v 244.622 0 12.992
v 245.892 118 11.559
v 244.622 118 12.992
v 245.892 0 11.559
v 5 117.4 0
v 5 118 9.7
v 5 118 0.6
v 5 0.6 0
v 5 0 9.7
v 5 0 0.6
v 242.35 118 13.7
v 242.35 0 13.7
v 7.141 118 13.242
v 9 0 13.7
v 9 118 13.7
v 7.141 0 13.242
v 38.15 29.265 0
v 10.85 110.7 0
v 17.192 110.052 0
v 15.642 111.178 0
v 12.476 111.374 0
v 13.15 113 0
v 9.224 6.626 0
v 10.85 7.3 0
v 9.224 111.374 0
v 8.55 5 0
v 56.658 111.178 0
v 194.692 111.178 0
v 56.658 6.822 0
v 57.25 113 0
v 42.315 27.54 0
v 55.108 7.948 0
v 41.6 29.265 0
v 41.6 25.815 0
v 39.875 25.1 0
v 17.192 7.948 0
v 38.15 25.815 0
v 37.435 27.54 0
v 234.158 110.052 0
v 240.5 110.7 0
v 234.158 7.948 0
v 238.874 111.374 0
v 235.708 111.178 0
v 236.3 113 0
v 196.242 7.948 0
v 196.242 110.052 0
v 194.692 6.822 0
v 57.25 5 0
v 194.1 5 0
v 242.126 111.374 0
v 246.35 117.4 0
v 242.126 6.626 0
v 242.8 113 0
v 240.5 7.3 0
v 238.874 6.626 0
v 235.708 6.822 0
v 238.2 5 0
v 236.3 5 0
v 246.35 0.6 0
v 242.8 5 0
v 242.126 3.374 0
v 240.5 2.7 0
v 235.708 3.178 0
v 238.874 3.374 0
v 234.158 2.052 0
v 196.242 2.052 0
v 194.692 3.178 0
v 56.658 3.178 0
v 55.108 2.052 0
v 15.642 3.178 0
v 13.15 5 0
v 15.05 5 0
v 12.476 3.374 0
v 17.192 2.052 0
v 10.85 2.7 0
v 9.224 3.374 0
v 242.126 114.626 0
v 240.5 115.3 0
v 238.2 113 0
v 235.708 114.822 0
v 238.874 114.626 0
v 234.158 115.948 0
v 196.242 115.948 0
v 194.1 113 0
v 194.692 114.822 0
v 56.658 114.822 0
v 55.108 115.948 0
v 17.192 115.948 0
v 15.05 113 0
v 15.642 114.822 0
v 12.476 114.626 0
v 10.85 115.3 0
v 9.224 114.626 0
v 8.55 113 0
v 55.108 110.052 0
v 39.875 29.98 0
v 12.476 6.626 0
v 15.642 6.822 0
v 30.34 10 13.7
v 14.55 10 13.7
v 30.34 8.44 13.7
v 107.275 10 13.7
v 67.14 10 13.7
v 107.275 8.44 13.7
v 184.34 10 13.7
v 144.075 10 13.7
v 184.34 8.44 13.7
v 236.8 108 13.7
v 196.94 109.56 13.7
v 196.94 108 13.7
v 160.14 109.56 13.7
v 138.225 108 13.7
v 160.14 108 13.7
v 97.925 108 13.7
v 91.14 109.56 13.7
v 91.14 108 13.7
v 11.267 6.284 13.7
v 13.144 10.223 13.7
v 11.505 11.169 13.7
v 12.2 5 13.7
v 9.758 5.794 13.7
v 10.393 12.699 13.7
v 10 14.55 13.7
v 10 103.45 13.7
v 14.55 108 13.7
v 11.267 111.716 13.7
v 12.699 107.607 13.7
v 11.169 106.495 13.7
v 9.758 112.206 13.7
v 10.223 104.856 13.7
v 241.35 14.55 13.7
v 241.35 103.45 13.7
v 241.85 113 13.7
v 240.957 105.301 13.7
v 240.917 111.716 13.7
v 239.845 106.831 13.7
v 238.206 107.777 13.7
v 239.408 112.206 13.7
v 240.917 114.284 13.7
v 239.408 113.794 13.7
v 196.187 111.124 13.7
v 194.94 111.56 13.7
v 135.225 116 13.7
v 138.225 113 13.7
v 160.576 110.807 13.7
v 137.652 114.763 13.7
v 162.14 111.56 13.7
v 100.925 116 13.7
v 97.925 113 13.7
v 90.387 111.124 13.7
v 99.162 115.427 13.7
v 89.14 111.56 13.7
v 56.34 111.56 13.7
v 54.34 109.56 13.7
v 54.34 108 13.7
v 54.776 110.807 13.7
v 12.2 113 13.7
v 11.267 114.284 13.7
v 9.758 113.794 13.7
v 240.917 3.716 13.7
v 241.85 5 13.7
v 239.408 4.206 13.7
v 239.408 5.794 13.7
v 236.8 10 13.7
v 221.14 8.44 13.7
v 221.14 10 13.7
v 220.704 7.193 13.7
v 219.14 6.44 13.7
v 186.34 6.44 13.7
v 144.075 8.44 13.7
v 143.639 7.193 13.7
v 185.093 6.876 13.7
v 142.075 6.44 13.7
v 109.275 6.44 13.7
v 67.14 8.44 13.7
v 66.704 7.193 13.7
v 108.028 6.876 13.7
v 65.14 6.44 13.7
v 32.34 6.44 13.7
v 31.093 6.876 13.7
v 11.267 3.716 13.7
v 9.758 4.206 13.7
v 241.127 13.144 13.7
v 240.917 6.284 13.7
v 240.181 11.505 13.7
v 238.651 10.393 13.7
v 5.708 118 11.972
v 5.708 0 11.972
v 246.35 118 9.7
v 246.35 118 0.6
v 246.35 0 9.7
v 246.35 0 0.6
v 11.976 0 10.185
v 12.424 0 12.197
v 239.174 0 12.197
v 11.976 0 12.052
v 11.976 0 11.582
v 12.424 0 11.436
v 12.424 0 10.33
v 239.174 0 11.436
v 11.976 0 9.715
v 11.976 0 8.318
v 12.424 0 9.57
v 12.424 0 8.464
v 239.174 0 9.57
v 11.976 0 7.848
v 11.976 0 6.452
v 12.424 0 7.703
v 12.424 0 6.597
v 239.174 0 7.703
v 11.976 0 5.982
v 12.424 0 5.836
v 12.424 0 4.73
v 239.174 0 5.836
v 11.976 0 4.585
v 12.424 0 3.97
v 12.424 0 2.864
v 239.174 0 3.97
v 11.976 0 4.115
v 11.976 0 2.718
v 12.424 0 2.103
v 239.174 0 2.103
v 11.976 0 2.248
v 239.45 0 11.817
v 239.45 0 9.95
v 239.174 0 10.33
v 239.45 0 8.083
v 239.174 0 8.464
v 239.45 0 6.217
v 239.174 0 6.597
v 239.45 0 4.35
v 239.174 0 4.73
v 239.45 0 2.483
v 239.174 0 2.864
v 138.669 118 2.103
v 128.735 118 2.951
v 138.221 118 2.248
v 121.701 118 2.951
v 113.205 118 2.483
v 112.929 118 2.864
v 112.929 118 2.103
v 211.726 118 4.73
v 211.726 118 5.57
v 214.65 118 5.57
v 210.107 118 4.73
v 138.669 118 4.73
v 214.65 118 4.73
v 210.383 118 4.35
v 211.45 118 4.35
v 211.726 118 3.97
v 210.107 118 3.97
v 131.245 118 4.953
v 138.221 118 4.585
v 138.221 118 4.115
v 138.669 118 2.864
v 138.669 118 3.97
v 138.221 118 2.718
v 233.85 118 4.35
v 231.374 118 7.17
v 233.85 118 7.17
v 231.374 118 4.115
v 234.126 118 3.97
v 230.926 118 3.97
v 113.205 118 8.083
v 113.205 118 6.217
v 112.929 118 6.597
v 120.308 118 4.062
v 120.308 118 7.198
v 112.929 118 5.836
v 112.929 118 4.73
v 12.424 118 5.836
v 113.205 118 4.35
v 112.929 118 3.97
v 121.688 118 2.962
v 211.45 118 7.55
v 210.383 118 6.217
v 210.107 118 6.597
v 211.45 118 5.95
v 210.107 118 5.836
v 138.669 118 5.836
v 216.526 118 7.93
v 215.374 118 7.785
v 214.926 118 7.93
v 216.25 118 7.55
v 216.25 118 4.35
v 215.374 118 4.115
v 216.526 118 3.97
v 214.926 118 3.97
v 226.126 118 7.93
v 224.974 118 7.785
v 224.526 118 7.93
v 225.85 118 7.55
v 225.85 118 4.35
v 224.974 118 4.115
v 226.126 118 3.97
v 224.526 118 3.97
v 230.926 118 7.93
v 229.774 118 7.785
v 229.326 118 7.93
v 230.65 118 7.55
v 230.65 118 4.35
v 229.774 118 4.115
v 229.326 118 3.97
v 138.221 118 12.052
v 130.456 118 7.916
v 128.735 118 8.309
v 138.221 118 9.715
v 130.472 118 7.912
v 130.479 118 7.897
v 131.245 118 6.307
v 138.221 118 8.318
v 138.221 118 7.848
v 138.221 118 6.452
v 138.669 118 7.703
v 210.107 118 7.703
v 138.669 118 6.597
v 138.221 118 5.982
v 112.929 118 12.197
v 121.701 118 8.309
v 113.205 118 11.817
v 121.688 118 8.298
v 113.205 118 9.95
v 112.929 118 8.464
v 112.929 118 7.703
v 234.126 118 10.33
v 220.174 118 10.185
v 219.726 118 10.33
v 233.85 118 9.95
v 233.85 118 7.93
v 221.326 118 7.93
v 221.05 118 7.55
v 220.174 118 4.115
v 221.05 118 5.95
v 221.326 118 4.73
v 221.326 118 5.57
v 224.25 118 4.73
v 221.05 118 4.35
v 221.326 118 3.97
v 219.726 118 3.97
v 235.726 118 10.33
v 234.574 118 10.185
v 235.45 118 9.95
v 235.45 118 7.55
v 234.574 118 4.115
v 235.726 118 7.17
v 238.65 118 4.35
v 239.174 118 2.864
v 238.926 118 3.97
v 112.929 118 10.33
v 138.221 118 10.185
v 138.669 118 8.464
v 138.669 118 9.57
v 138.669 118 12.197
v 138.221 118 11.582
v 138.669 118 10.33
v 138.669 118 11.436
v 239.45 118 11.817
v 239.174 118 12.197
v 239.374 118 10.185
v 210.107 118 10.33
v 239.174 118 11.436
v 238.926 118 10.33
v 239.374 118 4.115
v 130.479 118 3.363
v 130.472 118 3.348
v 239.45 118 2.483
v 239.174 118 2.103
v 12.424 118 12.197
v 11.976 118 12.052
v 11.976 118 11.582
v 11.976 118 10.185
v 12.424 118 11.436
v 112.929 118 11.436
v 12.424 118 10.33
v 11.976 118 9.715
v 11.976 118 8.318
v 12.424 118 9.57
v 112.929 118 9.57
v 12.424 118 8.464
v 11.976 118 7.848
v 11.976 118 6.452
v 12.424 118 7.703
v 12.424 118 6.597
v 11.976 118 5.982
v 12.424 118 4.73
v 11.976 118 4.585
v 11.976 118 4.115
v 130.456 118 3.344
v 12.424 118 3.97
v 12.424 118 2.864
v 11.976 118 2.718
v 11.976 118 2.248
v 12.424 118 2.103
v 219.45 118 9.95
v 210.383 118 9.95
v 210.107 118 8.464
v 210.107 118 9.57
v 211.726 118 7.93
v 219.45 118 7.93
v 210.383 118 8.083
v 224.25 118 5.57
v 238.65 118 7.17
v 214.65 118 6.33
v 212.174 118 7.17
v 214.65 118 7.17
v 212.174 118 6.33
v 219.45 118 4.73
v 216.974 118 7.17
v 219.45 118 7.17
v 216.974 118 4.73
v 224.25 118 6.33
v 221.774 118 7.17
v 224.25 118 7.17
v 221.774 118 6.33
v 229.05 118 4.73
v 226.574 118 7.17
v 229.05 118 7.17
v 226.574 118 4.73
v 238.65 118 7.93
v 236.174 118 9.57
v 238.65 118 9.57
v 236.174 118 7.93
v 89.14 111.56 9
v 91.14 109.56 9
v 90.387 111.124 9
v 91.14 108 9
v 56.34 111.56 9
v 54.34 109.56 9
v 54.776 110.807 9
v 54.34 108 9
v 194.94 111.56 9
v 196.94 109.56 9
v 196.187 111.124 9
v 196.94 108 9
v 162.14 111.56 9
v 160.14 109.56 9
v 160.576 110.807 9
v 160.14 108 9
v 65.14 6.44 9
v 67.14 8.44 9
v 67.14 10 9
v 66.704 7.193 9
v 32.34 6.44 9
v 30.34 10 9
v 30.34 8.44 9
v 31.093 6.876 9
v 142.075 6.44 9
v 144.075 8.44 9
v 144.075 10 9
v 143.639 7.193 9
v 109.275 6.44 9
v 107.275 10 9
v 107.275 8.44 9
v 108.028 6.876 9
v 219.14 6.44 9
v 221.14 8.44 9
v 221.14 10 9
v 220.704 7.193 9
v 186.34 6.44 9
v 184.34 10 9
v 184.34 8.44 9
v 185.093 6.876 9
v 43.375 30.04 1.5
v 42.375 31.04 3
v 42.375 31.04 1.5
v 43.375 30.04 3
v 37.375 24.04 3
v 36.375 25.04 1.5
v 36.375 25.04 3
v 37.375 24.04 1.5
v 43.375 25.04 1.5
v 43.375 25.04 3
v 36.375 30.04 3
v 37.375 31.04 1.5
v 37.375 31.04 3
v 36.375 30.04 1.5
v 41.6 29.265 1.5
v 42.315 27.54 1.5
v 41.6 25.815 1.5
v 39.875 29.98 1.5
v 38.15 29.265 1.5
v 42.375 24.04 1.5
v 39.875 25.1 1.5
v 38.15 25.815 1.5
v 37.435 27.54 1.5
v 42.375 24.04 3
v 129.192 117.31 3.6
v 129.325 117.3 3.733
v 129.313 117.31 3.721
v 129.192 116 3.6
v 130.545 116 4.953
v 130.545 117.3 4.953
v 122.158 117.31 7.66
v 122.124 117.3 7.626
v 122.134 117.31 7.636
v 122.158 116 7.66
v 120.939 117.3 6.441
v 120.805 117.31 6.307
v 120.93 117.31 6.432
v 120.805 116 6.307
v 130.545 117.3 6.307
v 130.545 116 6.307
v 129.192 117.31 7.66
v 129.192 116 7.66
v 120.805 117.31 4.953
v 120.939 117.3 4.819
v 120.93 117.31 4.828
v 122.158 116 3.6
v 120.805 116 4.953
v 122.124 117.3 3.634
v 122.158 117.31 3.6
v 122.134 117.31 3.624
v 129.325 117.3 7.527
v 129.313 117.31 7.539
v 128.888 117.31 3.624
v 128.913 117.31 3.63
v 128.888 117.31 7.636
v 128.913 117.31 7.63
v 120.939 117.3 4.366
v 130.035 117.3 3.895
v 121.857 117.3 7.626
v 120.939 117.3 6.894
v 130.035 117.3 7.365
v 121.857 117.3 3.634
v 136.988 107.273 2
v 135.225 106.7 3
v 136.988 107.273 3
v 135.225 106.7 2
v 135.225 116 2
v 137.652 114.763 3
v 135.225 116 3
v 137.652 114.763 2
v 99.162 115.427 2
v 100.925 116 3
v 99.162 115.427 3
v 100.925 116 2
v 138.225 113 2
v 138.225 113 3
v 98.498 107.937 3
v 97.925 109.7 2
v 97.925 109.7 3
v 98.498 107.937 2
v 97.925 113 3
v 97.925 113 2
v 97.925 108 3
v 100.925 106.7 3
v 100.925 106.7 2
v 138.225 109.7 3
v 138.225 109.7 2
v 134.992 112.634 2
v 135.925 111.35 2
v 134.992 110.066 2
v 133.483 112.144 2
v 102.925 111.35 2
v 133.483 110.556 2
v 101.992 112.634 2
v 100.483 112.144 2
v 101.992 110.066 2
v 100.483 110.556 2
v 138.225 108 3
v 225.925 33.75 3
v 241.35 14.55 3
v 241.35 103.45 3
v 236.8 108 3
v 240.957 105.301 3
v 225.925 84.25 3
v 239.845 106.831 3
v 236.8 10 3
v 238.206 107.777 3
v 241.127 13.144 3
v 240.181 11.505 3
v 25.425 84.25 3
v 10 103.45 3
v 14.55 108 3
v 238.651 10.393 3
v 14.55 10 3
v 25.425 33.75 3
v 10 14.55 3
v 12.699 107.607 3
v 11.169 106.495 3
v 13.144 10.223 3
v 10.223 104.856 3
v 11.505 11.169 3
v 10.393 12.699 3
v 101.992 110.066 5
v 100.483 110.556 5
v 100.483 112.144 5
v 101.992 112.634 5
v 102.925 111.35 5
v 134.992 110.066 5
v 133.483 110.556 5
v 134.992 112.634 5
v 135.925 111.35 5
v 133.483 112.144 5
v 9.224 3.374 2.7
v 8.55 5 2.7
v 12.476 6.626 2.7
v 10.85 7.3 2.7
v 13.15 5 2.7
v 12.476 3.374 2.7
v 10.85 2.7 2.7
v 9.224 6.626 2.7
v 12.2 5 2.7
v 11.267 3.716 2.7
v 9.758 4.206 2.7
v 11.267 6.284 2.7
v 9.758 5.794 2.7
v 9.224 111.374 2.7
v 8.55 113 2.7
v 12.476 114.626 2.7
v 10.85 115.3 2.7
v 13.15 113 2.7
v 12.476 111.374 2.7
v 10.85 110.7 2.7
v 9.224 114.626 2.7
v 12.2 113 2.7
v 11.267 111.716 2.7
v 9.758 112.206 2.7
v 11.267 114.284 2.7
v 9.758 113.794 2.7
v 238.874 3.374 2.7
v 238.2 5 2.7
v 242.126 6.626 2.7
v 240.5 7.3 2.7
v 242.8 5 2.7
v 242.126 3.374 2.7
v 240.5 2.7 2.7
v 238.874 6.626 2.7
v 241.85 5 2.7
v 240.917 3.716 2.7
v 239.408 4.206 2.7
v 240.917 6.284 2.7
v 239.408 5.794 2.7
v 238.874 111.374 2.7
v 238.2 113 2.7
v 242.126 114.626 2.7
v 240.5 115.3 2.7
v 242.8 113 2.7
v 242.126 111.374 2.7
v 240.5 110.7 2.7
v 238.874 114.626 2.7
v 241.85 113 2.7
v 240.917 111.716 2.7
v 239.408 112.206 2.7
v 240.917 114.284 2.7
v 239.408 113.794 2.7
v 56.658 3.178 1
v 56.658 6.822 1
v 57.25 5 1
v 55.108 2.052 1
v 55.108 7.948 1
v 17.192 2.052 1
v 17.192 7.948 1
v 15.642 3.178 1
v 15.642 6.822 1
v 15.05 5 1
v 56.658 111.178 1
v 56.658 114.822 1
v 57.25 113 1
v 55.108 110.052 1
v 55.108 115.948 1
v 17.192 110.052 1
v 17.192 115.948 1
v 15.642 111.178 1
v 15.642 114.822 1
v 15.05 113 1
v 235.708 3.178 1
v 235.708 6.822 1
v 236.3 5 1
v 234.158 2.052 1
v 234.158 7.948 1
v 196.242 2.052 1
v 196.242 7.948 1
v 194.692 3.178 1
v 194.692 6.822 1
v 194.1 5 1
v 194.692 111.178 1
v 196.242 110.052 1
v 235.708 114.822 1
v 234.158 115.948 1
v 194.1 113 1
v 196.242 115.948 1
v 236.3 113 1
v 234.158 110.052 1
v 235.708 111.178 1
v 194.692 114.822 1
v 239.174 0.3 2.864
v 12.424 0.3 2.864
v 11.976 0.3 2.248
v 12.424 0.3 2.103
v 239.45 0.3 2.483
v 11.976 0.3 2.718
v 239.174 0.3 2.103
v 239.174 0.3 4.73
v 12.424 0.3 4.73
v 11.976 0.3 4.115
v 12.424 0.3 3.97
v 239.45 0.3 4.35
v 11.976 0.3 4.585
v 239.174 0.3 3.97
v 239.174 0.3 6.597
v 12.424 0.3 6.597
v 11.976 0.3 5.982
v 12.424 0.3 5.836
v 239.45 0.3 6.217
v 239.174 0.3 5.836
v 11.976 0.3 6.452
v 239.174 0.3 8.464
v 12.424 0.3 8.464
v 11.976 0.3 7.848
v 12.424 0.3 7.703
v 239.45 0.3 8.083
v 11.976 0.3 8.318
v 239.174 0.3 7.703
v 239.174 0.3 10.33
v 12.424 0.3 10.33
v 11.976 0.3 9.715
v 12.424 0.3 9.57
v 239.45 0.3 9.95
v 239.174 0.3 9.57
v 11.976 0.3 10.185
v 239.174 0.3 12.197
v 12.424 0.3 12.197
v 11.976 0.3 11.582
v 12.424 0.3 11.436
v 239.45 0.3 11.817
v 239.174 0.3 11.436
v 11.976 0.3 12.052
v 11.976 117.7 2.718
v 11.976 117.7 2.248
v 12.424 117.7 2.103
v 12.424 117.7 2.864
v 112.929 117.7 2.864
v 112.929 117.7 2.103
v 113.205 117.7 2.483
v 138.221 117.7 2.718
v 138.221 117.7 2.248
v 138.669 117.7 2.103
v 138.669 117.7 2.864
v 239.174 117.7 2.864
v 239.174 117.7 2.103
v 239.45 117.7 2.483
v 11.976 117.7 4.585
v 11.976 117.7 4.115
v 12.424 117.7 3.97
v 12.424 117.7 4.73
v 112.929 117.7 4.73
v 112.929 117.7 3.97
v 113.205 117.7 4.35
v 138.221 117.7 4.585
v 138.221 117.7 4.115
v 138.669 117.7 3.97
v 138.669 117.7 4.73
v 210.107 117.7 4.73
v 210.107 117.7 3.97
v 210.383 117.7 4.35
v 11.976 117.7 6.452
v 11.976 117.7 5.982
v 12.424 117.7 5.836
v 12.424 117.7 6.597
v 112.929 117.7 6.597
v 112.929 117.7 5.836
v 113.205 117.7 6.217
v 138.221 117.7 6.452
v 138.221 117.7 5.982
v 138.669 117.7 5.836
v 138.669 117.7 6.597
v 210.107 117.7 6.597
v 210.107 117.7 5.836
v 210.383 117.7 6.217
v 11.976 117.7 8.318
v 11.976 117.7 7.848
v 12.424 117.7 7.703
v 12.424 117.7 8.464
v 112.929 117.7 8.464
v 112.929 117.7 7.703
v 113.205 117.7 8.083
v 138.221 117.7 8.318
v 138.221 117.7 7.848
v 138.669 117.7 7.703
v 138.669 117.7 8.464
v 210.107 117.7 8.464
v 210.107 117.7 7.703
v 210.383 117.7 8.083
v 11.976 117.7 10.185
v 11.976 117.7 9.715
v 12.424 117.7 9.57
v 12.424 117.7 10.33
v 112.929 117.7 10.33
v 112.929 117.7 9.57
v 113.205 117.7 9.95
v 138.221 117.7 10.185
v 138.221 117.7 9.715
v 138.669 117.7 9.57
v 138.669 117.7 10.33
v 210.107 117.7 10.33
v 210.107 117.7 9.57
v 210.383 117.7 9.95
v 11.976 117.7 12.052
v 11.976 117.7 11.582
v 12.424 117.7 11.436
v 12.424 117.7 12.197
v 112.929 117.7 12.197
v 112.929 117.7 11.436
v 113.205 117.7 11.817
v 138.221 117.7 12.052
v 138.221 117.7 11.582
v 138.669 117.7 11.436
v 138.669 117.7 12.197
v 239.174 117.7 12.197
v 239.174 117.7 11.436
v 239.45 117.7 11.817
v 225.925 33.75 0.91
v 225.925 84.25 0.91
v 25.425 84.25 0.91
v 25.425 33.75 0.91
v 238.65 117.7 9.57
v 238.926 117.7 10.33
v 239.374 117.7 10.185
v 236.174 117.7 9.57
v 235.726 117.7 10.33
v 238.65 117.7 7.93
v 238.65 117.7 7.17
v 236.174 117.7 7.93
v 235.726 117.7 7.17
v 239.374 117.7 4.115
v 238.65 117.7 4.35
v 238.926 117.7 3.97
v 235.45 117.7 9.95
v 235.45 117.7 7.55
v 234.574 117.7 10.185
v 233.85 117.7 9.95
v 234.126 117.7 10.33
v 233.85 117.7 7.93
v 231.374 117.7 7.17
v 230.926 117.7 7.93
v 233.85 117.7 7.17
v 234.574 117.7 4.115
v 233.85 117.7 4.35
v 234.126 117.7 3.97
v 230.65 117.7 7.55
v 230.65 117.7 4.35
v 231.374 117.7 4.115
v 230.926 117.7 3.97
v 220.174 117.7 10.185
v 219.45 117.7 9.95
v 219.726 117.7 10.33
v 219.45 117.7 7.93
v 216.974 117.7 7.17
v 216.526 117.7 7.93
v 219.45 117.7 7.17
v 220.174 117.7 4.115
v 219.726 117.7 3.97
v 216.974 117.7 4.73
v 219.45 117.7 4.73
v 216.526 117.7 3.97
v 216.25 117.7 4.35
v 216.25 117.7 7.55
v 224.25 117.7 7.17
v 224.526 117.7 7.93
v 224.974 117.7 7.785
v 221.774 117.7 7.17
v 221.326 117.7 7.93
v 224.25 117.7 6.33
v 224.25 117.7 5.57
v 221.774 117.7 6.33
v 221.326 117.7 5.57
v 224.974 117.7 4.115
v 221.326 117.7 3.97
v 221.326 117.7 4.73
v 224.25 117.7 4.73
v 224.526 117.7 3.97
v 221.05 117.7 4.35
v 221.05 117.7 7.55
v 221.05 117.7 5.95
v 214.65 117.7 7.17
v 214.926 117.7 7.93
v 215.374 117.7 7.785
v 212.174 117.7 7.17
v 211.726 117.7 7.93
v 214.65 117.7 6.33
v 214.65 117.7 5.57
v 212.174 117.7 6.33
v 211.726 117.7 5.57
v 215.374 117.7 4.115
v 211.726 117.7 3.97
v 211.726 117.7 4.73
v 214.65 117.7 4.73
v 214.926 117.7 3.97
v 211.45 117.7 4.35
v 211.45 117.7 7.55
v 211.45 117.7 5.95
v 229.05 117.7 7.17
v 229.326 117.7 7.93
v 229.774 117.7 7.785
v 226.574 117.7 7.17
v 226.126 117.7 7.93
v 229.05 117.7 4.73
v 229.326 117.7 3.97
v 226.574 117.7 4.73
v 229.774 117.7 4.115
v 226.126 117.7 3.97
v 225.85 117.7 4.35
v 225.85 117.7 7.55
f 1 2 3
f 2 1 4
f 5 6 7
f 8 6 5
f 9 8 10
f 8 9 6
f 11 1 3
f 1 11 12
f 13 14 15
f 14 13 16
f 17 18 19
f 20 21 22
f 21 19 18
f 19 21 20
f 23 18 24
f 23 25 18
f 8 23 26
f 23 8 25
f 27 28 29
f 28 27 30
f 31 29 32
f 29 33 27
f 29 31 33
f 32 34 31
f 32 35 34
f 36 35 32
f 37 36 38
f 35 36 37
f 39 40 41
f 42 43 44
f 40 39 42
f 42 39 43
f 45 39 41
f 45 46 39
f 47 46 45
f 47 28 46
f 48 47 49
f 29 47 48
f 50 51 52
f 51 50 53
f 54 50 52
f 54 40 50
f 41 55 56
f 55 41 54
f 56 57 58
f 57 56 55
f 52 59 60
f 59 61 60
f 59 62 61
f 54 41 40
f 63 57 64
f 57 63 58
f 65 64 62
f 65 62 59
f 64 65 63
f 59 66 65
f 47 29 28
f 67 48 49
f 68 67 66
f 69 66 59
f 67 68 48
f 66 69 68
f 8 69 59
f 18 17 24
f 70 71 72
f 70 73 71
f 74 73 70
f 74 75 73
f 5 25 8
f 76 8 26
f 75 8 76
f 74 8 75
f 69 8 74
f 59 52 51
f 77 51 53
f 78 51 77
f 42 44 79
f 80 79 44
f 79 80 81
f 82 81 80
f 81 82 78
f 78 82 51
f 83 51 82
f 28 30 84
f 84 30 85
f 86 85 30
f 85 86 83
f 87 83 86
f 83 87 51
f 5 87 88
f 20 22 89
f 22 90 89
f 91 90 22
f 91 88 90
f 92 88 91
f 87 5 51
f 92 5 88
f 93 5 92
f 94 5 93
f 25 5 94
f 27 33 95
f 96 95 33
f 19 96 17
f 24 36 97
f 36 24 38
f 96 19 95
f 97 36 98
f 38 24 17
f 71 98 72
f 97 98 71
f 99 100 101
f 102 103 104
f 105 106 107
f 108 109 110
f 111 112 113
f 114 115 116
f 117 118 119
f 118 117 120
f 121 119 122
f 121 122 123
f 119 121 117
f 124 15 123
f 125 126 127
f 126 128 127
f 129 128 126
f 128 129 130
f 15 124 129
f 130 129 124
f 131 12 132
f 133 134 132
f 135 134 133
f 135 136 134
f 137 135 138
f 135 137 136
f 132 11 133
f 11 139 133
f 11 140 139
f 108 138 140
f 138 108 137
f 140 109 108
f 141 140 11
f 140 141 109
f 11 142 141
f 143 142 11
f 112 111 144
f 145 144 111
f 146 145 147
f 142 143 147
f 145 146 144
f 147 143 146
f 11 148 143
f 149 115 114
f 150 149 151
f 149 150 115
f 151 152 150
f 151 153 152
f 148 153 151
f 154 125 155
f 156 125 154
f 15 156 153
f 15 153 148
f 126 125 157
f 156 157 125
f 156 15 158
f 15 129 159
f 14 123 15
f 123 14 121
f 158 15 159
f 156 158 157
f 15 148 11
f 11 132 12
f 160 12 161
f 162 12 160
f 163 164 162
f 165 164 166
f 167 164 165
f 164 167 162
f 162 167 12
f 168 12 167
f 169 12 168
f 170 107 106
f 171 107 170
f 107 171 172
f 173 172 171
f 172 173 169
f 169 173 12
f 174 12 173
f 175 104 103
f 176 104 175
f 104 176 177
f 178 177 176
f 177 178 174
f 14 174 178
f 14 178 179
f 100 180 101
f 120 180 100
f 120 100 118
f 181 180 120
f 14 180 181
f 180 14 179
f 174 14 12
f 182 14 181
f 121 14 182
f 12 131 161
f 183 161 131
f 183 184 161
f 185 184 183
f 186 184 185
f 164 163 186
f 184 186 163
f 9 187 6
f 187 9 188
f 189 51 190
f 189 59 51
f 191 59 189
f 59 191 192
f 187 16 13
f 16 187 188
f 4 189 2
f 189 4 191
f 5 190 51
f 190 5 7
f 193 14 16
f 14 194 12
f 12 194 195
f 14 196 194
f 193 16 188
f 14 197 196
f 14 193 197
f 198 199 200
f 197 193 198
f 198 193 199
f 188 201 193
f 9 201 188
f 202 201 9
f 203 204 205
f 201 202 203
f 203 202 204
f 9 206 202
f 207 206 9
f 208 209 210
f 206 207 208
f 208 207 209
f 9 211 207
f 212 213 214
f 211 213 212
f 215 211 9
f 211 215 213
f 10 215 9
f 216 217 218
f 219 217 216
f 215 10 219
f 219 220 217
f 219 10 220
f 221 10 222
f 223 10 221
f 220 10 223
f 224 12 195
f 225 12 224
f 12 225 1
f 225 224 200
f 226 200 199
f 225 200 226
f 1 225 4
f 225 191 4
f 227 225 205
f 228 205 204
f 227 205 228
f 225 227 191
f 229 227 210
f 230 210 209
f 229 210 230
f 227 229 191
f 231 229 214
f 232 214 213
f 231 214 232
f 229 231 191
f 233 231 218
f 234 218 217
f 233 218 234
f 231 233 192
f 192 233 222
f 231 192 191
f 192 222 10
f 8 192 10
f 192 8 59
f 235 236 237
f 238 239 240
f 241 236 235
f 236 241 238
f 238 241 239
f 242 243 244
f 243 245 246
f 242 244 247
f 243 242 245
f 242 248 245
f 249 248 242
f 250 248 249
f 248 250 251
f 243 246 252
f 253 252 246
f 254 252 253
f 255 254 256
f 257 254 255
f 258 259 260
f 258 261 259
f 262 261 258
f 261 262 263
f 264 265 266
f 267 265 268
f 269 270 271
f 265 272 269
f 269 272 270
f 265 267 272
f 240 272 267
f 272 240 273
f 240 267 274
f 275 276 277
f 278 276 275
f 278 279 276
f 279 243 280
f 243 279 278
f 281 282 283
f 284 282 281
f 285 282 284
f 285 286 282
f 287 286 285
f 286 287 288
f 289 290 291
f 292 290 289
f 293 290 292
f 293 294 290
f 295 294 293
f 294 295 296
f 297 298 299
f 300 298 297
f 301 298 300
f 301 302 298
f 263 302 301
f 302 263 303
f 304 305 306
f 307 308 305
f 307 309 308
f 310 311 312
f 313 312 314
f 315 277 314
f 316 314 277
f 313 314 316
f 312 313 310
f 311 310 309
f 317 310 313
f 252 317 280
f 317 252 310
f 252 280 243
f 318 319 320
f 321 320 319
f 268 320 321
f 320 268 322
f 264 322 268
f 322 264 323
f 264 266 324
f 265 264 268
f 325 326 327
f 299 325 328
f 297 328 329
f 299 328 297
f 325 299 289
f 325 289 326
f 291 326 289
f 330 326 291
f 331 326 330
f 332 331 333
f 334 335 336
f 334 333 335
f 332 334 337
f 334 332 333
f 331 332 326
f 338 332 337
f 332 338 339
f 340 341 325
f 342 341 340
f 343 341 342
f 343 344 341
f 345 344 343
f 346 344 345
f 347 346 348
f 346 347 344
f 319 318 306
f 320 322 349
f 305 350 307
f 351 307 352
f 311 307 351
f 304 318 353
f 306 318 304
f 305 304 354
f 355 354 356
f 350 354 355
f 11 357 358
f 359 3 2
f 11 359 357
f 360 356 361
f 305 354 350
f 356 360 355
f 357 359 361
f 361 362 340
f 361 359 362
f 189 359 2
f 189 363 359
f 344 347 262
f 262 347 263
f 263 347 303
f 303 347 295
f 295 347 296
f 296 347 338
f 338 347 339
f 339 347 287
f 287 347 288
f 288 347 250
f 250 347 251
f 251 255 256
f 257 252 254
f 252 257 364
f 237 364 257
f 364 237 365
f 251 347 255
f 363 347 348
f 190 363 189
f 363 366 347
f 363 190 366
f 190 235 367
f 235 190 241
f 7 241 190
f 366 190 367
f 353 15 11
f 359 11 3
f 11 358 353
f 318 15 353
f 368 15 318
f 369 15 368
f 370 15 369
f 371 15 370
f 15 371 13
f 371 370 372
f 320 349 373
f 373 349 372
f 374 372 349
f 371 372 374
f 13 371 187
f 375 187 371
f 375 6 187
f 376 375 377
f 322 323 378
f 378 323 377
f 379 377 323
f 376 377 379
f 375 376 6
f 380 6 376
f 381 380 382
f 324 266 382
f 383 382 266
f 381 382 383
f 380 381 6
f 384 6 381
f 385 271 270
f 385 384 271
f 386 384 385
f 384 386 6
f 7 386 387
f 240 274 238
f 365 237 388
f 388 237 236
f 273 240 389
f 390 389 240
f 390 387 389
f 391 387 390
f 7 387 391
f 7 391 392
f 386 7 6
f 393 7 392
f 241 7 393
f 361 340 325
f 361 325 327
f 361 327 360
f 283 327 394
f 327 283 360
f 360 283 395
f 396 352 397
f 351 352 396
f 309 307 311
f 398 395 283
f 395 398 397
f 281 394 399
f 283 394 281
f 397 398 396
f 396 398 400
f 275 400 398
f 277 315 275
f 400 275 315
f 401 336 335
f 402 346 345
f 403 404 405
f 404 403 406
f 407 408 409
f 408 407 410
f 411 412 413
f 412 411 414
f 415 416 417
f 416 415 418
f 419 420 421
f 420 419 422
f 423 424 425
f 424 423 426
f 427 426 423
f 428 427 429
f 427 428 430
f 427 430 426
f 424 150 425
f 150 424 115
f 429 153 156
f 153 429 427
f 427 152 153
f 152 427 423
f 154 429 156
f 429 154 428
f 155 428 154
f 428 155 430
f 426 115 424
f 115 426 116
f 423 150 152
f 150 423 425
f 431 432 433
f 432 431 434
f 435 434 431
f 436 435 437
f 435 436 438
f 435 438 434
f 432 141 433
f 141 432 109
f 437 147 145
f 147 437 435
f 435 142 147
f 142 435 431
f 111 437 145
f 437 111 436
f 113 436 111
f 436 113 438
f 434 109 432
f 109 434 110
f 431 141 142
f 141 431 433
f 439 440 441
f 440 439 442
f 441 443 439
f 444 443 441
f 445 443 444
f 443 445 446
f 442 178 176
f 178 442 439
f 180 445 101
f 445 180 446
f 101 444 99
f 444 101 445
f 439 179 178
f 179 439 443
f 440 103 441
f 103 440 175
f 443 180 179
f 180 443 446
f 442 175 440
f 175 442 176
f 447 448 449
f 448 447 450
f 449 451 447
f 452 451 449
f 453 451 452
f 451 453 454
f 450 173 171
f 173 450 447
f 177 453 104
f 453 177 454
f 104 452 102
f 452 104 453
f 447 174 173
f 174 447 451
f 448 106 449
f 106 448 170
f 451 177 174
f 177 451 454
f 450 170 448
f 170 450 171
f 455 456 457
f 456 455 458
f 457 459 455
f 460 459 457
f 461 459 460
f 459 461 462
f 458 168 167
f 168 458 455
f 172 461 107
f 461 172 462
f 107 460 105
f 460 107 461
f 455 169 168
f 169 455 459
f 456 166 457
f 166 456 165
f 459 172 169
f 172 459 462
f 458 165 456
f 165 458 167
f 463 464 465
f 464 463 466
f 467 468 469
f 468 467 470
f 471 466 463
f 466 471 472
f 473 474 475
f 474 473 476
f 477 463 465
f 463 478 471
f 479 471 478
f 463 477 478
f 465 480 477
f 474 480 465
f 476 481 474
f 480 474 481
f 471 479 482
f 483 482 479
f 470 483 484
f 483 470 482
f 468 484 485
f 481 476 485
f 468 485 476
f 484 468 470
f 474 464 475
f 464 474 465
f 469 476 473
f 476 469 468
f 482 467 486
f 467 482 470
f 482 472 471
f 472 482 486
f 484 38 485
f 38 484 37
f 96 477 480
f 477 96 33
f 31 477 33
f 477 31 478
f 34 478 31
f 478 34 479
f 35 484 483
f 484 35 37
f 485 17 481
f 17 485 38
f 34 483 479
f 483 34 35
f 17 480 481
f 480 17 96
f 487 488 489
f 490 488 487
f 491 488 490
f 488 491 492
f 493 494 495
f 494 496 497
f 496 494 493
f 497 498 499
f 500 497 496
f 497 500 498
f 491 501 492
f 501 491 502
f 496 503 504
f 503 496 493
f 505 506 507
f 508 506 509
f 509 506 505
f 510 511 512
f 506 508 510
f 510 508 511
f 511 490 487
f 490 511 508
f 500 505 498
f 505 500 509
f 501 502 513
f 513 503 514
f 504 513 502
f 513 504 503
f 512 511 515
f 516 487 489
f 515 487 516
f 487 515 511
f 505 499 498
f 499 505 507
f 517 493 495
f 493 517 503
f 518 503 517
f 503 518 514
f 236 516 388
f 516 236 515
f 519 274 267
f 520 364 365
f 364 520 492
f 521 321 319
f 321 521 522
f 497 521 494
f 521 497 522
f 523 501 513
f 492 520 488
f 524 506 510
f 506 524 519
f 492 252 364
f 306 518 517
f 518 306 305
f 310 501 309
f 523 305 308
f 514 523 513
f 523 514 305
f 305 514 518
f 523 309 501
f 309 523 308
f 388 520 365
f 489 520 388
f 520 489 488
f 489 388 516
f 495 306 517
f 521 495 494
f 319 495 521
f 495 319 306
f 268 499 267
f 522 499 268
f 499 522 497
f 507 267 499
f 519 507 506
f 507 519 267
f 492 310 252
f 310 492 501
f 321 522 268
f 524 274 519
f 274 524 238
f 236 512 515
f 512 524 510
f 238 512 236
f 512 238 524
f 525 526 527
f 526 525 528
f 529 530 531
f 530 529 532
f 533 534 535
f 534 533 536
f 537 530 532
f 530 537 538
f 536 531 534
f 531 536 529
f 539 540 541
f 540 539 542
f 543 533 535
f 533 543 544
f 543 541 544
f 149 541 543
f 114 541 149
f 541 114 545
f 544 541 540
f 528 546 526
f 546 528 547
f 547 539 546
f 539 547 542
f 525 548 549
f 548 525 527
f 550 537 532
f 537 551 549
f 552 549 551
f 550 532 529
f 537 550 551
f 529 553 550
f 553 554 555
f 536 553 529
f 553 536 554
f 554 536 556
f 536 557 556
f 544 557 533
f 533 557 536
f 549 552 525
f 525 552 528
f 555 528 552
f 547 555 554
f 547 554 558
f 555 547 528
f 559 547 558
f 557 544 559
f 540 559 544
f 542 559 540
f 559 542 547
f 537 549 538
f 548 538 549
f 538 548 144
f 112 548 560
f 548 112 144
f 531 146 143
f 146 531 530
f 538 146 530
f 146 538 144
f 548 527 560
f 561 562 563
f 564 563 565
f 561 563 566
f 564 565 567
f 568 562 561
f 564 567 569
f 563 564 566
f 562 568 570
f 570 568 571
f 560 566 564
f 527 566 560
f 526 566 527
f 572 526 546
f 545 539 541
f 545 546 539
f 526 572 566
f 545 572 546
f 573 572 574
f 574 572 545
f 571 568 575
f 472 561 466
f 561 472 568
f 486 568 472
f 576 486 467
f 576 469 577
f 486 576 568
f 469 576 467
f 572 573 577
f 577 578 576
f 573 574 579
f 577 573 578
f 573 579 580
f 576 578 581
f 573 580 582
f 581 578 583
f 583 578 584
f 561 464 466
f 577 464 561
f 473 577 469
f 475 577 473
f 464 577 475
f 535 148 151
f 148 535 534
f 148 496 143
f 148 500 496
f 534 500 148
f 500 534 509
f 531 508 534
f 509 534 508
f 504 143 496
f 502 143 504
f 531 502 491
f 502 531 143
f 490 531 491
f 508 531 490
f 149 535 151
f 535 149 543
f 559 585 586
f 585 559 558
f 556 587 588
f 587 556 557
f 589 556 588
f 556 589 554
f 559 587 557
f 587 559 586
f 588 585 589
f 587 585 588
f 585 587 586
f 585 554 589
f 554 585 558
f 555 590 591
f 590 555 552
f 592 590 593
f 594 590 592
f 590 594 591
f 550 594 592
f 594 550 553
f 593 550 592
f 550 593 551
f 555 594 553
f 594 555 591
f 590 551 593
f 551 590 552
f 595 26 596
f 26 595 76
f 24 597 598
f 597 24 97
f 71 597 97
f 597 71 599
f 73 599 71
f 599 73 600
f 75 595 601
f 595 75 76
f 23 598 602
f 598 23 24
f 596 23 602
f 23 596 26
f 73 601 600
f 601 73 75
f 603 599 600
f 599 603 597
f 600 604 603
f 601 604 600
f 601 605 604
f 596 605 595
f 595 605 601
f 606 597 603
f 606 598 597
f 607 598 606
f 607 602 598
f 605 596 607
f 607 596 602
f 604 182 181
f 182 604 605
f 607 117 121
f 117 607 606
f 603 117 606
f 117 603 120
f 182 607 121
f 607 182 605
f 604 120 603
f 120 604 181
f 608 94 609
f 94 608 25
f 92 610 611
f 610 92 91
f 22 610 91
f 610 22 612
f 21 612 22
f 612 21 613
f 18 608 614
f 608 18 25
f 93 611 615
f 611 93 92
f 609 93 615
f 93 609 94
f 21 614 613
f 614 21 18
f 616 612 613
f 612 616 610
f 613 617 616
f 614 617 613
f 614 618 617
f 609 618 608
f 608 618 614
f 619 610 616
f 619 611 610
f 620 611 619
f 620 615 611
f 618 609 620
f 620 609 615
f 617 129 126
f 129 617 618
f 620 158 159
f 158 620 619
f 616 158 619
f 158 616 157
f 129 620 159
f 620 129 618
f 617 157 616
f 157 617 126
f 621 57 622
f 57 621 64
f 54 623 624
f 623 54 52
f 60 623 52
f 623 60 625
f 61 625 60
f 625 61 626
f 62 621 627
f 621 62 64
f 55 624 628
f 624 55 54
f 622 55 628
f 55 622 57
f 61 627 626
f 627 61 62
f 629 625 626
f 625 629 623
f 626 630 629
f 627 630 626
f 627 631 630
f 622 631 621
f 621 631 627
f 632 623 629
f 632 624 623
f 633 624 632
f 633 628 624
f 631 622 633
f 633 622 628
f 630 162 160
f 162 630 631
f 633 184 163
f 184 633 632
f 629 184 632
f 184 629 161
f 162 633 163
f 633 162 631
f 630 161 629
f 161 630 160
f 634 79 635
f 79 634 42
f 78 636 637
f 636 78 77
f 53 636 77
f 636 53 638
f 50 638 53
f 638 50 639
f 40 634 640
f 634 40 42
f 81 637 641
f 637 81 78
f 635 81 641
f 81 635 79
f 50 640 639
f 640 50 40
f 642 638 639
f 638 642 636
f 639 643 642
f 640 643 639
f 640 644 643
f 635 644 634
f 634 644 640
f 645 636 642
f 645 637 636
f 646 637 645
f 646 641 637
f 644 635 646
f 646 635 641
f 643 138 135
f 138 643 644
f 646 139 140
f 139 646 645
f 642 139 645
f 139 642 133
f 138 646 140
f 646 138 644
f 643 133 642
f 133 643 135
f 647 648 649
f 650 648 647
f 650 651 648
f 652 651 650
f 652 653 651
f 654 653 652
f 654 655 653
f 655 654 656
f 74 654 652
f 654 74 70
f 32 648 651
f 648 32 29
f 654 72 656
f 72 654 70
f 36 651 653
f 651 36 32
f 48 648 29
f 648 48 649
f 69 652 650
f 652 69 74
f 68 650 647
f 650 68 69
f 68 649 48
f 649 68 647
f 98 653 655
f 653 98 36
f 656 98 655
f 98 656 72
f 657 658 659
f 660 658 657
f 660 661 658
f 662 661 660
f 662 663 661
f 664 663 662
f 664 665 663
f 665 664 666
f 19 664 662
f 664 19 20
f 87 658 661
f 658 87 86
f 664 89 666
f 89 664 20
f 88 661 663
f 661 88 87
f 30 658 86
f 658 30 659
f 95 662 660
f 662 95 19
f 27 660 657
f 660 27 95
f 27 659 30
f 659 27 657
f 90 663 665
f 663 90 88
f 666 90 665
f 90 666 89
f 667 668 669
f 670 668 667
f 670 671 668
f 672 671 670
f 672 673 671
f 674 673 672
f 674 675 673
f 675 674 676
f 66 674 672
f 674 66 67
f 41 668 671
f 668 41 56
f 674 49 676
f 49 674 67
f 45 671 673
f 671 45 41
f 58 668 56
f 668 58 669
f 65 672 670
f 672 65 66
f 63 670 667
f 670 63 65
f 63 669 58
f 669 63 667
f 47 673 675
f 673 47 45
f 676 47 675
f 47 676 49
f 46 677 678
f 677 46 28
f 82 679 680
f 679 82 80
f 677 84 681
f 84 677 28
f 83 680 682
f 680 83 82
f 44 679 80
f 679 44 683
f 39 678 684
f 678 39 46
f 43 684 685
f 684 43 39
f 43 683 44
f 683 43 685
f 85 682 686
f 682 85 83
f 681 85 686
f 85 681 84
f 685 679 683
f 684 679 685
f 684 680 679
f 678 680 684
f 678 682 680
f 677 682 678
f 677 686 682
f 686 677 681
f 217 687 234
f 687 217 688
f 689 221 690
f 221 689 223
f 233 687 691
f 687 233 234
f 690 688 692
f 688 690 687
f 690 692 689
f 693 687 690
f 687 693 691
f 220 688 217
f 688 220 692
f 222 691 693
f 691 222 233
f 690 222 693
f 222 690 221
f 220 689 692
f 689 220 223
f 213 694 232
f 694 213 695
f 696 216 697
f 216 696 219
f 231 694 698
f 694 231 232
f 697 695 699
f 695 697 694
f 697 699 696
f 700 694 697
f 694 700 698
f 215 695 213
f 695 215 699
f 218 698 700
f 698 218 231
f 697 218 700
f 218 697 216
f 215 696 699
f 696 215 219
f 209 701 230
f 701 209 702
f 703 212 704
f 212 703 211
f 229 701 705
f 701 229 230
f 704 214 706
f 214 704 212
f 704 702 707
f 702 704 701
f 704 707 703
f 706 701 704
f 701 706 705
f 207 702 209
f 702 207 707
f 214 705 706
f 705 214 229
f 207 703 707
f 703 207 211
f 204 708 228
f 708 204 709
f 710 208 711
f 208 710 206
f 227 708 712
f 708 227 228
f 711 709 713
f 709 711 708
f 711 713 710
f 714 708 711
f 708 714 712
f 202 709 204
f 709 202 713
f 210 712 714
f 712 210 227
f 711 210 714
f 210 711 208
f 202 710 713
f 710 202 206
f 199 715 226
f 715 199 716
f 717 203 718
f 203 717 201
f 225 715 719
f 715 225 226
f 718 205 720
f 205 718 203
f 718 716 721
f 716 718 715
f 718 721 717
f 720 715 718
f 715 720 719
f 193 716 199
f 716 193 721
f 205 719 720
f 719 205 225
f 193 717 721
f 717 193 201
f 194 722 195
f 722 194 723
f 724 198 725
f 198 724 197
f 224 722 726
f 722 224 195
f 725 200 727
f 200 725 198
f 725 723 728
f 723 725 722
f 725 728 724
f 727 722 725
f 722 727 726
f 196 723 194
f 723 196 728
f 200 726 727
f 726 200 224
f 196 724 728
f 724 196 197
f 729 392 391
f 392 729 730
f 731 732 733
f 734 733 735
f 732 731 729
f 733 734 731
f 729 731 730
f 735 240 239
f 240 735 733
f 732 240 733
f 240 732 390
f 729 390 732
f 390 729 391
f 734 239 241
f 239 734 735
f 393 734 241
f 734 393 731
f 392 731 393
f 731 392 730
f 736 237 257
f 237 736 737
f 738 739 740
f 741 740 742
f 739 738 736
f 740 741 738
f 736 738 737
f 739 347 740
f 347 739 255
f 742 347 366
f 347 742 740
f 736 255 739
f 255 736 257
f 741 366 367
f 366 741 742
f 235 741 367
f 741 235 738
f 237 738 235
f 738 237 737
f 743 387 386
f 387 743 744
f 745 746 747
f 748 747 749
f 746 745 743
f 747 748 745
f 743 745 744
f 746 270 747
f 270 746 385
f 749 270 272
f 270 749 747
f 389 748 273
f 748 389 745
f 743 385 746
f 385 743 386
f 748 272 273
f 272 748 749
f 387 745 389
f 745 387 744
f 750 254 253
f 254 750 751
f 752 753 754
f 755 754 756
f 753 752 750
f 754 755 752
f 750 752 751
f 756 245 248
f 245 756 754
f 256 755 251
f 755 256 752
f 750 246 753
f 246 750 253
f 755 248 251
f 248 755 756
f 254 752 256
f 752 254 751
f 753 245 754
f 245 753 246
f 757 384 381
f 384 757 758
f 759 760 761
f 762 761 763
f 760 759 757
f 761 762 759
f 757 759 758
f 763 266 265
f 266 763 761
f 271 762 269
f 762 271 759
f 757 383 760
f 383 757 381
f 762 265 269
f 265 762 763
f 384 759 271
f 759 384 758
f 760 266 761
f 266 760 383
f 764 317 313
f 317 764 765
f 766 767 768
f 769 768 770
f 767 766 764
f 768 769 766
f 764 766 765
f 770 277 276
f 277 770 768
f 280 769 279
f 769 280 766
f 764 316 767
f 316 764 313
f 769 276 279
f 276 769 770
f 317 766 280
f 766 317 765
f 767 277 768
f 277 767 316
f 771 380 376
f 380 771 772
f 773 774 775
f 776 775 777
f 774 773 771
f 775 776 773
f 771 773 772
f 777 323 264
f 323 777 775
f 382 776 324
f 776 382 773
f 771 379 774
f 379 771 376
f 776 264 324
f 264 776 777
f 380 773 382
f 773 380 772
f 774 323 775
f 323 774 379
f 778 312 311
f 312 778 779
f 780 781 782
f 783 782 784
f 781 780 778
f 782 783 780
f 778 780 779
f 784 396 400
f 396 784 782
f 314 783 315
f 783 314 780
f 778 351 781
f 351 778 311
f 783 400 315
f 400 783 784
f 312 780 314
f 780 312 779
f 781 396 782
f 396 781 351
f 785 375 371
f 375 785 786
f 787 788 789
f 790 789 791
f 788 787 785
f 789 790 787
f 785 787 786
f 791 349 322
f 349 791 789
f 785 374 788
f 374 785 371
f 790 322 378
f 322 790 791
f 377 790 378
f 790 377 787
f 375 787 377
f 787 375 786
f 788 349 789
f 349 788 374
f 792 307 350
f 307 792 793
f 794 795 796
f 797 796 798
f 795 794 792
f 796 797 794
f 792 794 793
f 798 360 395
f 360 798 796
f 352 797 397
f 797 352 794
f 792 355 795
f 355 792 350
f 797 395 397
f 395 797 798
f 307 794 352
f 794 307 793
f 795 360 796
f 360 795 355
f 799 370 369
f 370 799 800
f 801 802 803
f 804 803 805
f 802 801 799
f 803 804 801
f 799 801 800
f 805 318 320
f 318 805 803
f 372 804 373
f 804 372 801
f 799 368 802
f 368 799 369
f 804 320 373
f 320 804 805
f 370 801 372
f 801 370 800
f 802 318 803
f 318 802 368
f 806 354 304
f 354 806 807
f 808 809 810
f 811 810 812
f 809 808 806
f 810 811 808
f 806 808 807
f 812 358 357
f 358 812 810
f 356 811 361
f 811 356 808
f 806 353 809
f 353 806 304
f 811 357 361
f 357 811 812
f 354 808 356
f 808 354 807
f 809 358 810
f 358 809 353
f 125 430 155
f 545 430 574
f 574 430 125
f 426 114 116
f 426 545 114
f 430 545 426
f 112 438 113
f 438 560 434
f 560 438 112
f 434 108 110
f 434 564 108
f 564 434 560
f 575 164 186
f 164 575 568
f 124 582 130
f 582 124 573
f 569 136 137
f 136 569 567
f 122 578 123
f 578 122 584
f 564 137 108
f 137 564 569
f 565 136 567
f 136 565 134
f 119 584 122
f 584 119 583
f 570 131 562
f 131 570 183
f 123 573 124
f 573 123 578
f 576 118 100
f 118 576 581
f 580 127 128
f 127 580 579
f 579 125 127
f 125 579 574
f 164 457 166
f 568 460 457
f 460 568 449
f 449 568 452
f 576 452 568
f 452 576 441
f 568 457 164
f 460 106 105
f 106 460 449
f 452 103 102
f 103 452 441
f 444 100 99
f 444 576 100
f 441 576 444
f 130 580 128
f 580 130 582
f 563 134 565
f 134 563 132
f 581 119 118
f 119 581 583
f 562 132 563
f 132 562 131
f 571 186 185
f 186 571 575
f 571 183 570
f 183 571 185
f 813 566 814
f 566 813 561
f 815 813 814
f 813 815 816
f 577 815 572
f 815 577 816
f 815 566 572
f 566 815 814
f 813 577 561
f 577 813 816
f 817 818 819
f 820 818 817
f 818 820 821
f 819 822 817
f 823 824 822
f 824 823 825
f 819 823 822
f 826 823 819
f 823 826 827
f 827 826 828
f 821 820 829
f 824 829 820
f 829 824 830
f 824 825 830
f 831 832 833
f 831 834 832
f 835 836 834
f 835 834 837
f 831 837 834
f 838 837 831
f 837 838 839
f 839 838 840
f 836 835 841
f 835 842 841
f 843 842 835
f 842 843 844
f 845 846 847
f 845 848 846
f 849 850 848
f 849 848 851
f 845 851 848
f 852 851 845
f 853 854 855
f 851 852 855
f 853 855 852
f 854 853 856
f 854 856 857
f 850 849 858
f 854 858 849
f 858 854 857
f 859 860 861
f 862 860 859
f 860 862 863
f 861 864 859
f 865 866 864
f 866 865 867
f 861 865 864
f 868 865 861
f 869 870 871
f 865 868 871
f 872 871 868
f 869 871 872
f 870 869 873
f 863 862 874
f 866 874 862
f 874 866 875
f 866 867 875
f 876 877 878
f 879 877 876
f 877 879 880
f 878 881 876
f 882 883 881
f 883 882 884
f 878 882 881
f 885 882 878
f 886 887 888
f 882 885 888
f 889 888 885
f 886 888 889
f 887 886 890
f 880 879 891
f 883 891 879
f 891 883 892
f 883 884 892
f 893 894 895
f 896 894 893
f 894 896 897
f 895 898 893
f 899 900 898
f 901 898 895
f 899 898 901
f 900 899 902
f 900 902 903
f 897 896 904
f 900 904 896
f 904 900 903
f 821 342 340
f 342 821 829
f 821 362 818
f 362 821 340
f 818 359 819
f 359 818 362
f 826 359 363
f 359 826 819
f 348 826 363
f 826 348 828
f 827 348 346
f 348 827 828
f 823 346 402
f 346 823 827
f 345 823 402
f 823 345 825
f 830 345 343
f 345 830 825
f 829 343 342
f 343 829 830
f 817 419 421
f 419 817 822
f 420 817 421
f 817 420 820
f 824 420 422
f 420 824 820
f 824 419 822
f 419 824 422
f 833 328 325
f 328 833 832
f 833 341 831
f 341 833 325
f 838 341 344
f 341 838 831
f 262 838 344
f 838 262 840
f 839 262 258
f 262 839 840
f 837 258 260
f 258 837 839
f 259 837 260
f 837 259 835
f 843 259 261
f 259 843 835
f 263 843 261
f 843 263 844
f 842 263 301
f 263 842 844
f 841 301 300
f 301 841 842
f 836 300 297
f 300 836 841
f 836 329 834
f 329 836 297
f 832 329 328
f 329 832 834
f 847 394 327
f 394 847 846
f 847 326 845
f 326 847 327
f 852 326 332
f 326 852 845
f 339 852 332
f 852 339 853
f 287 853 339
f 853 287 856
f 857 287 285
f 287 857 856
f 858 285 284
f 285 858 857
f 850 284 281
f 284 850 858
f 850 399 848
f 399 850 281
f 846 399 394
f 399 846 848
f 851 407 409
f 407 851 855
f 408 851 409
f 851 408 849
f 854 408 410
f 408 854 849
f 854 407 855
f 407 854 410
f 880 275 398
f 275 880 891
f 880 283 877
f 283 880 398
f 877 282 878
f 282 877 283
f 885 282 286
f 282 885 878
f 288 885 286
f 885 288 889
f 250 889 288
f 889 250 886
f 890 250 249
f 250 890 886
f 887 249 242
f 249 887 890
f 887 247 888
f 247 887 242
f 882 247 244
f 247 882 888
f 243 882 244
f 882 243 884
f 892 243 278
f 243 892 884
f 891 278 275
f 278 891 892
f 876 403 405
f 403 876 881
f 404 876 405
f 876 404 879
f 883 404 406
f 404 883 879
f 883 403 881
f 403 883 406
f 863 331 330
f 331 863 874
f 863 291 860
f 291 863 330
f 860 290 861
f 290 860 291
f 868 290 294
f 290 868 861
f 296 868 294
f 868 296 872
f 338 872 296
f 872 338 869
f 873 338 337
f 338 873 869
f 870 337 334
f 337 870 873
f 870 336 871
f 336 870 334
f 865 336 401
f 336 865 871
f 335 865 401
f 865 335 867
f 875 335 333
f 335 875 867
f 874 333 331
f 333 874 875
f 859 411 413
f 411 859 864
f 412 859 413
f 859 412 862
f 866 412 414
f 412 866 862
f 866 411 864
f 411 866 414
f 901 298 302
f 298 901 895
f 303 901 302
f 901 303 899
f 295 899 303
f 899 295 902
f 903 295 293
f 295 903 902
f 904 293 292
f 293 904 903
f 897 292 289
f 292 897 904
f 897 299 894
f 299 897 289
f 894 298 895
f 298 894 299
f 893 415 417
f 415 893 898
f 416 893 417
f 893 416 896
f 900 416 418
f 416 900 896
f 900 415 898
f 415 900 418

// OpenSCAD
// file: rounded_rect.scad
module rounded_rect(size, r) {
  r = min(size[0] / 2, size[1] / 2, r);

  w = size[0] - 2 * r;
  h = size[1] - 2 * r;
  tol = 1e-6;
  if (w > tol && h > tol) {
    offset(r = r)
      translate([r, r])
        square([w, h]);
  } else if (w > tol || h > tol) {
    hull() {
      translate([r, r]) circle(r = r);
      translate([r + max(w, 0), r + max(h, 0)]) circle(r = r);
    }
  } else {
    translate([r, r]) circle(r = r);
  }
}

module rounded_rect_prism(size, r, convexity = 10) {
  linear_extrude(height = size[2], convexity = convexity) {
    rounded_rect([size[0], size[1]], r);
  }
}

module half_rounded_rect(size, r) {
  intersection() {
    offset(r = r)
      translate([r, -r])
        square([size[0] - 2 * r, size[1]]);
    square(size);
  }
}

module half_rounded_rect_prism(size, r, convexity = 10) {
  linear_extrude(height = size[2], convexity = convexity) {
    half_rounded_rect([size[0], size[1]], r);
  }
}
// file: logo.scad
/**
 * Segments of the logo in grid units.
 */
function logo_segments(ascent) = let(
  B = 0.5, // baseline stroke center
  X = 4.5, // x-height stroke center (o top bar, P lower bar, h shoulder)
  M = 2.5, // e middle bar stroke center
  T = ascent - 0.5, // ascender stroke center
  // e appears twice
  e = function (x) [
      [[x + 0.5, B], [x + 0.5, X]], [[x + 0.5, B], [x + 4.5, B]], [[x + 0.5, X], [x + 4.5, X]],
      [[x + 4.5, X], [x + 4.5, M]], [[x + 0.5, M], [x + 4.5, M]]
    ]
) concat(
    [[[0.5, B], [0.5, T]], [[0.5, T], [4.5, T]], [[4.5, T], [4.5, X]], [[0.5, X], [4.5, X]]], // P (x 0..5)
    [[[6.5, B], [6.5, T]], [[6.5, X], [10.5, X]], [[10.5, X], [10.5, B]]], // h (x 6..11)
    [[[12.5, B], [16.5, B]], [[16.5, B], [16.5, X]], [[16.5, X], [12.5, X]], [[12.5, X], [12.5, B]]], // o (x 12..17)
  e(18), // e (x 18..23)
    [[[24.5, B], [24.5, T]], [[24.5, B], [28.5, B]], [[28.5, B], [28.5, X]], [[24.5, X], [28.5, X]]], // b (x 24..29)
  e(30) // e (x 30..35)
);

logo_width_units = 35; // 6 letters x 5 units + 5 gaps x 1 unit

module pen_stroke(a, b, u) {
  hull() {
    translate(a * u) circle(d = u);
    translate(b * u) circle(d = u);
  }
}

/**
 * 2D "Phoebe" logo with its origin at the bottom-left corner.
 *
 * `height` - total letter height in mm
 * `ascent` - how many units letters with ascent take up in total.

 * The stroke width follows as height / ascent.
 */
module logo(height, ascent = 8) {
  assert(ascent >= 6, "ascent must be larger than base-grid");
  u = height / ascent;
  for (s = logo_segments(ascent)) {
    pen_stroke(s[0], s[1], u);
  }
}

/**
 * The width of the logo.
 */
function logo_width(height, ascent = 8) = logo_width_units * height / ascent;
// file: udb.scad
include <spec.scad>;
use <rounded_rect.scad>;

module udb() {
  // Center X on USB port, align Y with front edge, set Z to slot base
  translate([-udb_usb_port_offset, -udb_depth, -udb_pit_height]) {
    difference() {
      union() {
        udb_pit();
        udb_slot();
        translate([udb_usb_port_offset, 0, udb_pcb_height + udb_usb_connector_height / 2]) {
          usb_connector();
          translate([0, udb_depth + udb_usb_connector_overhang]) {
            usb_chamfer(
              inner = [udb_usb_connector_width, udb_usb_connector_height],
              depth = udb_usb_flare,
              flare = udb_usb_flare,
              r = udb_usb_port_radius
            );
          }
        }
      }
      translate([(udb_width - udb_hole_distance) / 2, udb_depth / 2]) {
        cylinder(h = udb_pin_height, r = udb_pin_radius);
        translate([udb_hole_distance, 0]) {
          cylinder(h = udb_pin_height, r = udb_pin_radius);
        }
      }
    }
  }
}

/**
 * The pit where the UDB PCB sits in.
 */
module udb_pit() {
  rounded_rect_prism(size = [udb_width, udb_depth, udb_pit_height + eps], r = udb_corner_radius);
}

/**
 * A slot above the UDB pit where the module can be inserted from.
 */
module udb_slot() {
  translate([0, udb_depth - udb_slot_depth, udb_pit_height]) {
    half_rounded_rect_prism(
      size = [udb_width, udb_slot_depth, pocket_top_z + eps],
      r = udb_corner_radius
    );
  }
}

/**
 * The USB connector itself
 */
module usb_connector() {
  rounded_tunnel(
    size = [udb_usb_connector_width, udb_usb_connector_height, udb_depth + udb_usb_connector_overhang + eps],
    r = udb_usb_port_radius
  );
}

/**
 * A chamfer between the USB connector and the case.
 */
module usb_chamfer(inner = [10, 4], depth = 0.7, flare = 0.7, r = 1) {
  hull() {
    for (x = [-1, 1], z = [-1, 1]) {
      translate([x * (inner[0] / 2 - r), 0, z * (inner[1] / 2 - r)])
        rotate([-90, 0, 0])
          cylinder(h = depth + eps, r1 = r, r2 = r + flare * (depth + eps) / depth);
    }
  }
}

/**
 * A cutout for a USB connector or cable.
 */
module rounded_tunnel(size, r) {
  rotate([-90, 0, 0]) {
    translate([-size[0] / 2, -size[1] / 2]) {
      rounded_rect_prism(size, r);
    }
  }
}
// main file
include <spec.scad>;
include <udb.scad>;
use <logo.scad>;
use <rounded_rect.scad>;

module case_tub() {
  color("white") {
    difference() {
      case_tub_outer();

      // Main cavity
      translate([case_wall_thickness, case_wall_thickness, case_floor_thickness]) {
        rounded_rect_prism([case_tub_inner_width, case_tub_inner_depth, case_tub_height], r = case_tub_inner_radius);
      }
      // Gasket pockets
      translate([assembly_x, 0, case_tub_height - pocket_height]) {
        translate([0, case_depth - assembly_y]) {
          for (i = top_tabs_center_x) {
            translate([i, 0]) {
              pocket();
            }
          }
        }
        translate([0, assembly_y]) {
          for (i = bottom_tabs_center_x) {
            translate([i, 0]) {
              pocket();
            }
          }
        }
      }
      // Reset button
      reset_button_x = assembly_x + pcb_reset_button_center[0];
      reset_button_y = assembly_y + pcb_reset_button_center[1];
      reset_button_z = assembly_z + pcb_bot_z;
      translate([reset_button_x, reset_button_y, reset_button_z]) {
        reset_button_pocket();
      }
      // UDB + USB port
      translate([case_width / 2, case_depth - udb_port_wall_thickness, case_floor_thickness]) {
        udb();
      }
      // Screw holes
      for (screw_x = [screw_length_inset, case_width - screw_length_inset]) {
        for (screw_y = [screw_depth_inset, case_depth - screw_depth_inset]) {
          translate([screw_x, screw_y, -eps]) {
            screw_hole();
          }
        }
      }
      // Feet
      for (foot_x = [foot_length_inset, case_width - foot_length_inset - foot_pocket_width]) {
        for (foot_y = [foot_depth_inset, case_depth - foot_depth_inset - foot_pocket_depth]) {
          translate([foot_x, foot_y, -eps]) {
            # foot_pocket();
          }
        }
      }
      // Weight cavity
      weight_pocket_x = case_wall_thickness + weight_x;
      weight_pocket_y = case_wall_thickness + weight_y;
      weight_pocket_z = case_floor_thickness - weight_recess_depth;
      translate([weight_pocket_x, weight_pocket_y, weight_pocket_z]) {
        cube([weight_pocket_width, weight_pocket_depth, weight_recess_depth + eps]);
      }

      // Details
      detail_x = assembly_x + (pcb_edge_to_switch_distance - xda_keycap_width / 2);
      detail_gap = detail_x - case_tub_side_offset;

      // Logo
      logo_x = case_width - detail_x;
      logo_z = detail_face_bot_z + (detail_face_height - logo_height) / 2;
      translate([logo_x, case_depth + eps, logo_z]) {
        rotate([90, 0, 0]) {
          mirror([1, 0, 0]) {
            # linear_extrude(height = detail_engraving_depth + eps) {
              logo(height = logo_height, ascent = logo_ascent);
            }
          }
        }
      }
      // Face grooves
      groove_band_z = detail_face_bot_z + groove_band_margin;
      groove_length_front = case_width - 2 * detail_x;
      // Front
      for (i = [0 : groove_count - 1]) {
        groove_z = groove_band_z + i * groove_pitch;
        translate([detail_x, -eps, groove_z]) {
          # groove(length = groove_length_front);
        }
      }
      // Back
      logo_width = logo_width(height = logo_height, ascent = logo_ascent);
      groove_length_back = (case_width - udb_usb_mouth_width) / 2 - detail_x - detail_gap;
      for (i = [0 : groove_count - 1]) {
        groove_z = groove_band_z + i * groove_pitch;
        translate([detail_x, case_depth + eps, groove_z]) {
          # groove(length = groove_length_back, front = false);
        }
        translate([(case_width + udb_usb_mouth_width) / 2 + detail_gap, case_depth + eps, groove_z]) {
          groove_logo_inset = i > 0 && i < groove_count - 1
            ? logo_width + groove_gap
            : 0;
          # groove(length = groove_length_back - groove_logo_inset, front = false);
        }
      }
    }
  }
}

/**
 * The case bottom tubs outer hull with chamfered edges at the front/back bottom.
 */
module case_tub_outer() {
  intersection() {
    translate([case_tub_side_offset, -eps, 0]) {
      rotate([90, 0, 0]) {
        mirror([0, 0, 1]) {
          half_rounded_rect_prism(
            size = [case_tub_width, case_tub_height, case_tub_depth + 2 * eps],
            r = case_seam_radius
          );
        }
      }
    }
    translate([case_tub_side_offset - eps, 0, 0]) {
      rotate([90, 0, 90]) {
        linear_extrude(height = case_tub_width + 2 * eps) {
          // Bottom tub profile the from side with chamfer
          polygon([
              [case_floor_chamfer, 0],
              [case_tub_depth - case_floor_chamfer, 0],
              [case_tub_depth, case_floor_chamfer],
              [case_tub_depth, case_tub_height],
              [0, case_tub_height],
              [0, case_floor_chamfer]
            ]);
        }
      }
    }
  }
}

/**
 * Cutout for a plate-mount gasket pocket, centered on the tab position.
 *
 * Extends pocket_depth to BOTH sides of the wall's inner face, so the same module serves the front and back walls.
 * The half that reaches into the cavity cuts empty space and is harmless.
 */
module pocket() {
  translate([-pocket_width / 2, -pocket_depth]) {
    rounded_rect_prism([pocket_width, pocket_depth * 2, pocket_height + eps], r = pocket_radius);
  }
}

module screw_hole() {
  union() {
    cylinder(h = screw_counterbore_depth + eps, r = screw_counterbore_diameter / 2);
    cylinder(h = screw_counterbore_depth + eps + screw_length, r = screw_hole_diameter / 2);
  }
}

module foot_pocket() {
  rounded_rect_prism([foot_pocket_width, foot_pocket_depth, foot_pocket_height + eps], r = foot_pocket_radius);
}

module reset_button_pocket() {
  union() {
    translate([-reset_button_hole_width / 2, -reset_button_hole_width / 2, -reset_button_clearance_height]) {
      // No eps as it's positioned from pcb_bot_z
      rounded_rect_prism(
        size = [reset_button_hole_width, reset_button_hole_width, reset_button_clearance_height],
        r = reset_button_corner_radius
      );
    }
    translate([0, 0, -reset_button_hole_height]) {
      cylinder(h = reset_button_hole_height, r = reset_button_hole_radius);
    }
  }
}

module groove(length, front = true) {
  mirror([0, front ? 1 : 0, 0]) {
    rotate([90, 0, 0]) {
      rounded_rect_prism([length, detail_stroke_width, detail_engraving_depth + eps], r = detail_stroke_width / 2);
    }
  }
}

// Unused, but potentially useful for later
function face_edge_inset(z) = let(
  fillet_start_z = detail_face_top_z - case_seam_radius,
  rise = min(max(0, z - fillet_start_z), case_seam_radius)
) case_seam_radius - sqrt(case_seam_radius^2 - rise^2);

case_tub();
